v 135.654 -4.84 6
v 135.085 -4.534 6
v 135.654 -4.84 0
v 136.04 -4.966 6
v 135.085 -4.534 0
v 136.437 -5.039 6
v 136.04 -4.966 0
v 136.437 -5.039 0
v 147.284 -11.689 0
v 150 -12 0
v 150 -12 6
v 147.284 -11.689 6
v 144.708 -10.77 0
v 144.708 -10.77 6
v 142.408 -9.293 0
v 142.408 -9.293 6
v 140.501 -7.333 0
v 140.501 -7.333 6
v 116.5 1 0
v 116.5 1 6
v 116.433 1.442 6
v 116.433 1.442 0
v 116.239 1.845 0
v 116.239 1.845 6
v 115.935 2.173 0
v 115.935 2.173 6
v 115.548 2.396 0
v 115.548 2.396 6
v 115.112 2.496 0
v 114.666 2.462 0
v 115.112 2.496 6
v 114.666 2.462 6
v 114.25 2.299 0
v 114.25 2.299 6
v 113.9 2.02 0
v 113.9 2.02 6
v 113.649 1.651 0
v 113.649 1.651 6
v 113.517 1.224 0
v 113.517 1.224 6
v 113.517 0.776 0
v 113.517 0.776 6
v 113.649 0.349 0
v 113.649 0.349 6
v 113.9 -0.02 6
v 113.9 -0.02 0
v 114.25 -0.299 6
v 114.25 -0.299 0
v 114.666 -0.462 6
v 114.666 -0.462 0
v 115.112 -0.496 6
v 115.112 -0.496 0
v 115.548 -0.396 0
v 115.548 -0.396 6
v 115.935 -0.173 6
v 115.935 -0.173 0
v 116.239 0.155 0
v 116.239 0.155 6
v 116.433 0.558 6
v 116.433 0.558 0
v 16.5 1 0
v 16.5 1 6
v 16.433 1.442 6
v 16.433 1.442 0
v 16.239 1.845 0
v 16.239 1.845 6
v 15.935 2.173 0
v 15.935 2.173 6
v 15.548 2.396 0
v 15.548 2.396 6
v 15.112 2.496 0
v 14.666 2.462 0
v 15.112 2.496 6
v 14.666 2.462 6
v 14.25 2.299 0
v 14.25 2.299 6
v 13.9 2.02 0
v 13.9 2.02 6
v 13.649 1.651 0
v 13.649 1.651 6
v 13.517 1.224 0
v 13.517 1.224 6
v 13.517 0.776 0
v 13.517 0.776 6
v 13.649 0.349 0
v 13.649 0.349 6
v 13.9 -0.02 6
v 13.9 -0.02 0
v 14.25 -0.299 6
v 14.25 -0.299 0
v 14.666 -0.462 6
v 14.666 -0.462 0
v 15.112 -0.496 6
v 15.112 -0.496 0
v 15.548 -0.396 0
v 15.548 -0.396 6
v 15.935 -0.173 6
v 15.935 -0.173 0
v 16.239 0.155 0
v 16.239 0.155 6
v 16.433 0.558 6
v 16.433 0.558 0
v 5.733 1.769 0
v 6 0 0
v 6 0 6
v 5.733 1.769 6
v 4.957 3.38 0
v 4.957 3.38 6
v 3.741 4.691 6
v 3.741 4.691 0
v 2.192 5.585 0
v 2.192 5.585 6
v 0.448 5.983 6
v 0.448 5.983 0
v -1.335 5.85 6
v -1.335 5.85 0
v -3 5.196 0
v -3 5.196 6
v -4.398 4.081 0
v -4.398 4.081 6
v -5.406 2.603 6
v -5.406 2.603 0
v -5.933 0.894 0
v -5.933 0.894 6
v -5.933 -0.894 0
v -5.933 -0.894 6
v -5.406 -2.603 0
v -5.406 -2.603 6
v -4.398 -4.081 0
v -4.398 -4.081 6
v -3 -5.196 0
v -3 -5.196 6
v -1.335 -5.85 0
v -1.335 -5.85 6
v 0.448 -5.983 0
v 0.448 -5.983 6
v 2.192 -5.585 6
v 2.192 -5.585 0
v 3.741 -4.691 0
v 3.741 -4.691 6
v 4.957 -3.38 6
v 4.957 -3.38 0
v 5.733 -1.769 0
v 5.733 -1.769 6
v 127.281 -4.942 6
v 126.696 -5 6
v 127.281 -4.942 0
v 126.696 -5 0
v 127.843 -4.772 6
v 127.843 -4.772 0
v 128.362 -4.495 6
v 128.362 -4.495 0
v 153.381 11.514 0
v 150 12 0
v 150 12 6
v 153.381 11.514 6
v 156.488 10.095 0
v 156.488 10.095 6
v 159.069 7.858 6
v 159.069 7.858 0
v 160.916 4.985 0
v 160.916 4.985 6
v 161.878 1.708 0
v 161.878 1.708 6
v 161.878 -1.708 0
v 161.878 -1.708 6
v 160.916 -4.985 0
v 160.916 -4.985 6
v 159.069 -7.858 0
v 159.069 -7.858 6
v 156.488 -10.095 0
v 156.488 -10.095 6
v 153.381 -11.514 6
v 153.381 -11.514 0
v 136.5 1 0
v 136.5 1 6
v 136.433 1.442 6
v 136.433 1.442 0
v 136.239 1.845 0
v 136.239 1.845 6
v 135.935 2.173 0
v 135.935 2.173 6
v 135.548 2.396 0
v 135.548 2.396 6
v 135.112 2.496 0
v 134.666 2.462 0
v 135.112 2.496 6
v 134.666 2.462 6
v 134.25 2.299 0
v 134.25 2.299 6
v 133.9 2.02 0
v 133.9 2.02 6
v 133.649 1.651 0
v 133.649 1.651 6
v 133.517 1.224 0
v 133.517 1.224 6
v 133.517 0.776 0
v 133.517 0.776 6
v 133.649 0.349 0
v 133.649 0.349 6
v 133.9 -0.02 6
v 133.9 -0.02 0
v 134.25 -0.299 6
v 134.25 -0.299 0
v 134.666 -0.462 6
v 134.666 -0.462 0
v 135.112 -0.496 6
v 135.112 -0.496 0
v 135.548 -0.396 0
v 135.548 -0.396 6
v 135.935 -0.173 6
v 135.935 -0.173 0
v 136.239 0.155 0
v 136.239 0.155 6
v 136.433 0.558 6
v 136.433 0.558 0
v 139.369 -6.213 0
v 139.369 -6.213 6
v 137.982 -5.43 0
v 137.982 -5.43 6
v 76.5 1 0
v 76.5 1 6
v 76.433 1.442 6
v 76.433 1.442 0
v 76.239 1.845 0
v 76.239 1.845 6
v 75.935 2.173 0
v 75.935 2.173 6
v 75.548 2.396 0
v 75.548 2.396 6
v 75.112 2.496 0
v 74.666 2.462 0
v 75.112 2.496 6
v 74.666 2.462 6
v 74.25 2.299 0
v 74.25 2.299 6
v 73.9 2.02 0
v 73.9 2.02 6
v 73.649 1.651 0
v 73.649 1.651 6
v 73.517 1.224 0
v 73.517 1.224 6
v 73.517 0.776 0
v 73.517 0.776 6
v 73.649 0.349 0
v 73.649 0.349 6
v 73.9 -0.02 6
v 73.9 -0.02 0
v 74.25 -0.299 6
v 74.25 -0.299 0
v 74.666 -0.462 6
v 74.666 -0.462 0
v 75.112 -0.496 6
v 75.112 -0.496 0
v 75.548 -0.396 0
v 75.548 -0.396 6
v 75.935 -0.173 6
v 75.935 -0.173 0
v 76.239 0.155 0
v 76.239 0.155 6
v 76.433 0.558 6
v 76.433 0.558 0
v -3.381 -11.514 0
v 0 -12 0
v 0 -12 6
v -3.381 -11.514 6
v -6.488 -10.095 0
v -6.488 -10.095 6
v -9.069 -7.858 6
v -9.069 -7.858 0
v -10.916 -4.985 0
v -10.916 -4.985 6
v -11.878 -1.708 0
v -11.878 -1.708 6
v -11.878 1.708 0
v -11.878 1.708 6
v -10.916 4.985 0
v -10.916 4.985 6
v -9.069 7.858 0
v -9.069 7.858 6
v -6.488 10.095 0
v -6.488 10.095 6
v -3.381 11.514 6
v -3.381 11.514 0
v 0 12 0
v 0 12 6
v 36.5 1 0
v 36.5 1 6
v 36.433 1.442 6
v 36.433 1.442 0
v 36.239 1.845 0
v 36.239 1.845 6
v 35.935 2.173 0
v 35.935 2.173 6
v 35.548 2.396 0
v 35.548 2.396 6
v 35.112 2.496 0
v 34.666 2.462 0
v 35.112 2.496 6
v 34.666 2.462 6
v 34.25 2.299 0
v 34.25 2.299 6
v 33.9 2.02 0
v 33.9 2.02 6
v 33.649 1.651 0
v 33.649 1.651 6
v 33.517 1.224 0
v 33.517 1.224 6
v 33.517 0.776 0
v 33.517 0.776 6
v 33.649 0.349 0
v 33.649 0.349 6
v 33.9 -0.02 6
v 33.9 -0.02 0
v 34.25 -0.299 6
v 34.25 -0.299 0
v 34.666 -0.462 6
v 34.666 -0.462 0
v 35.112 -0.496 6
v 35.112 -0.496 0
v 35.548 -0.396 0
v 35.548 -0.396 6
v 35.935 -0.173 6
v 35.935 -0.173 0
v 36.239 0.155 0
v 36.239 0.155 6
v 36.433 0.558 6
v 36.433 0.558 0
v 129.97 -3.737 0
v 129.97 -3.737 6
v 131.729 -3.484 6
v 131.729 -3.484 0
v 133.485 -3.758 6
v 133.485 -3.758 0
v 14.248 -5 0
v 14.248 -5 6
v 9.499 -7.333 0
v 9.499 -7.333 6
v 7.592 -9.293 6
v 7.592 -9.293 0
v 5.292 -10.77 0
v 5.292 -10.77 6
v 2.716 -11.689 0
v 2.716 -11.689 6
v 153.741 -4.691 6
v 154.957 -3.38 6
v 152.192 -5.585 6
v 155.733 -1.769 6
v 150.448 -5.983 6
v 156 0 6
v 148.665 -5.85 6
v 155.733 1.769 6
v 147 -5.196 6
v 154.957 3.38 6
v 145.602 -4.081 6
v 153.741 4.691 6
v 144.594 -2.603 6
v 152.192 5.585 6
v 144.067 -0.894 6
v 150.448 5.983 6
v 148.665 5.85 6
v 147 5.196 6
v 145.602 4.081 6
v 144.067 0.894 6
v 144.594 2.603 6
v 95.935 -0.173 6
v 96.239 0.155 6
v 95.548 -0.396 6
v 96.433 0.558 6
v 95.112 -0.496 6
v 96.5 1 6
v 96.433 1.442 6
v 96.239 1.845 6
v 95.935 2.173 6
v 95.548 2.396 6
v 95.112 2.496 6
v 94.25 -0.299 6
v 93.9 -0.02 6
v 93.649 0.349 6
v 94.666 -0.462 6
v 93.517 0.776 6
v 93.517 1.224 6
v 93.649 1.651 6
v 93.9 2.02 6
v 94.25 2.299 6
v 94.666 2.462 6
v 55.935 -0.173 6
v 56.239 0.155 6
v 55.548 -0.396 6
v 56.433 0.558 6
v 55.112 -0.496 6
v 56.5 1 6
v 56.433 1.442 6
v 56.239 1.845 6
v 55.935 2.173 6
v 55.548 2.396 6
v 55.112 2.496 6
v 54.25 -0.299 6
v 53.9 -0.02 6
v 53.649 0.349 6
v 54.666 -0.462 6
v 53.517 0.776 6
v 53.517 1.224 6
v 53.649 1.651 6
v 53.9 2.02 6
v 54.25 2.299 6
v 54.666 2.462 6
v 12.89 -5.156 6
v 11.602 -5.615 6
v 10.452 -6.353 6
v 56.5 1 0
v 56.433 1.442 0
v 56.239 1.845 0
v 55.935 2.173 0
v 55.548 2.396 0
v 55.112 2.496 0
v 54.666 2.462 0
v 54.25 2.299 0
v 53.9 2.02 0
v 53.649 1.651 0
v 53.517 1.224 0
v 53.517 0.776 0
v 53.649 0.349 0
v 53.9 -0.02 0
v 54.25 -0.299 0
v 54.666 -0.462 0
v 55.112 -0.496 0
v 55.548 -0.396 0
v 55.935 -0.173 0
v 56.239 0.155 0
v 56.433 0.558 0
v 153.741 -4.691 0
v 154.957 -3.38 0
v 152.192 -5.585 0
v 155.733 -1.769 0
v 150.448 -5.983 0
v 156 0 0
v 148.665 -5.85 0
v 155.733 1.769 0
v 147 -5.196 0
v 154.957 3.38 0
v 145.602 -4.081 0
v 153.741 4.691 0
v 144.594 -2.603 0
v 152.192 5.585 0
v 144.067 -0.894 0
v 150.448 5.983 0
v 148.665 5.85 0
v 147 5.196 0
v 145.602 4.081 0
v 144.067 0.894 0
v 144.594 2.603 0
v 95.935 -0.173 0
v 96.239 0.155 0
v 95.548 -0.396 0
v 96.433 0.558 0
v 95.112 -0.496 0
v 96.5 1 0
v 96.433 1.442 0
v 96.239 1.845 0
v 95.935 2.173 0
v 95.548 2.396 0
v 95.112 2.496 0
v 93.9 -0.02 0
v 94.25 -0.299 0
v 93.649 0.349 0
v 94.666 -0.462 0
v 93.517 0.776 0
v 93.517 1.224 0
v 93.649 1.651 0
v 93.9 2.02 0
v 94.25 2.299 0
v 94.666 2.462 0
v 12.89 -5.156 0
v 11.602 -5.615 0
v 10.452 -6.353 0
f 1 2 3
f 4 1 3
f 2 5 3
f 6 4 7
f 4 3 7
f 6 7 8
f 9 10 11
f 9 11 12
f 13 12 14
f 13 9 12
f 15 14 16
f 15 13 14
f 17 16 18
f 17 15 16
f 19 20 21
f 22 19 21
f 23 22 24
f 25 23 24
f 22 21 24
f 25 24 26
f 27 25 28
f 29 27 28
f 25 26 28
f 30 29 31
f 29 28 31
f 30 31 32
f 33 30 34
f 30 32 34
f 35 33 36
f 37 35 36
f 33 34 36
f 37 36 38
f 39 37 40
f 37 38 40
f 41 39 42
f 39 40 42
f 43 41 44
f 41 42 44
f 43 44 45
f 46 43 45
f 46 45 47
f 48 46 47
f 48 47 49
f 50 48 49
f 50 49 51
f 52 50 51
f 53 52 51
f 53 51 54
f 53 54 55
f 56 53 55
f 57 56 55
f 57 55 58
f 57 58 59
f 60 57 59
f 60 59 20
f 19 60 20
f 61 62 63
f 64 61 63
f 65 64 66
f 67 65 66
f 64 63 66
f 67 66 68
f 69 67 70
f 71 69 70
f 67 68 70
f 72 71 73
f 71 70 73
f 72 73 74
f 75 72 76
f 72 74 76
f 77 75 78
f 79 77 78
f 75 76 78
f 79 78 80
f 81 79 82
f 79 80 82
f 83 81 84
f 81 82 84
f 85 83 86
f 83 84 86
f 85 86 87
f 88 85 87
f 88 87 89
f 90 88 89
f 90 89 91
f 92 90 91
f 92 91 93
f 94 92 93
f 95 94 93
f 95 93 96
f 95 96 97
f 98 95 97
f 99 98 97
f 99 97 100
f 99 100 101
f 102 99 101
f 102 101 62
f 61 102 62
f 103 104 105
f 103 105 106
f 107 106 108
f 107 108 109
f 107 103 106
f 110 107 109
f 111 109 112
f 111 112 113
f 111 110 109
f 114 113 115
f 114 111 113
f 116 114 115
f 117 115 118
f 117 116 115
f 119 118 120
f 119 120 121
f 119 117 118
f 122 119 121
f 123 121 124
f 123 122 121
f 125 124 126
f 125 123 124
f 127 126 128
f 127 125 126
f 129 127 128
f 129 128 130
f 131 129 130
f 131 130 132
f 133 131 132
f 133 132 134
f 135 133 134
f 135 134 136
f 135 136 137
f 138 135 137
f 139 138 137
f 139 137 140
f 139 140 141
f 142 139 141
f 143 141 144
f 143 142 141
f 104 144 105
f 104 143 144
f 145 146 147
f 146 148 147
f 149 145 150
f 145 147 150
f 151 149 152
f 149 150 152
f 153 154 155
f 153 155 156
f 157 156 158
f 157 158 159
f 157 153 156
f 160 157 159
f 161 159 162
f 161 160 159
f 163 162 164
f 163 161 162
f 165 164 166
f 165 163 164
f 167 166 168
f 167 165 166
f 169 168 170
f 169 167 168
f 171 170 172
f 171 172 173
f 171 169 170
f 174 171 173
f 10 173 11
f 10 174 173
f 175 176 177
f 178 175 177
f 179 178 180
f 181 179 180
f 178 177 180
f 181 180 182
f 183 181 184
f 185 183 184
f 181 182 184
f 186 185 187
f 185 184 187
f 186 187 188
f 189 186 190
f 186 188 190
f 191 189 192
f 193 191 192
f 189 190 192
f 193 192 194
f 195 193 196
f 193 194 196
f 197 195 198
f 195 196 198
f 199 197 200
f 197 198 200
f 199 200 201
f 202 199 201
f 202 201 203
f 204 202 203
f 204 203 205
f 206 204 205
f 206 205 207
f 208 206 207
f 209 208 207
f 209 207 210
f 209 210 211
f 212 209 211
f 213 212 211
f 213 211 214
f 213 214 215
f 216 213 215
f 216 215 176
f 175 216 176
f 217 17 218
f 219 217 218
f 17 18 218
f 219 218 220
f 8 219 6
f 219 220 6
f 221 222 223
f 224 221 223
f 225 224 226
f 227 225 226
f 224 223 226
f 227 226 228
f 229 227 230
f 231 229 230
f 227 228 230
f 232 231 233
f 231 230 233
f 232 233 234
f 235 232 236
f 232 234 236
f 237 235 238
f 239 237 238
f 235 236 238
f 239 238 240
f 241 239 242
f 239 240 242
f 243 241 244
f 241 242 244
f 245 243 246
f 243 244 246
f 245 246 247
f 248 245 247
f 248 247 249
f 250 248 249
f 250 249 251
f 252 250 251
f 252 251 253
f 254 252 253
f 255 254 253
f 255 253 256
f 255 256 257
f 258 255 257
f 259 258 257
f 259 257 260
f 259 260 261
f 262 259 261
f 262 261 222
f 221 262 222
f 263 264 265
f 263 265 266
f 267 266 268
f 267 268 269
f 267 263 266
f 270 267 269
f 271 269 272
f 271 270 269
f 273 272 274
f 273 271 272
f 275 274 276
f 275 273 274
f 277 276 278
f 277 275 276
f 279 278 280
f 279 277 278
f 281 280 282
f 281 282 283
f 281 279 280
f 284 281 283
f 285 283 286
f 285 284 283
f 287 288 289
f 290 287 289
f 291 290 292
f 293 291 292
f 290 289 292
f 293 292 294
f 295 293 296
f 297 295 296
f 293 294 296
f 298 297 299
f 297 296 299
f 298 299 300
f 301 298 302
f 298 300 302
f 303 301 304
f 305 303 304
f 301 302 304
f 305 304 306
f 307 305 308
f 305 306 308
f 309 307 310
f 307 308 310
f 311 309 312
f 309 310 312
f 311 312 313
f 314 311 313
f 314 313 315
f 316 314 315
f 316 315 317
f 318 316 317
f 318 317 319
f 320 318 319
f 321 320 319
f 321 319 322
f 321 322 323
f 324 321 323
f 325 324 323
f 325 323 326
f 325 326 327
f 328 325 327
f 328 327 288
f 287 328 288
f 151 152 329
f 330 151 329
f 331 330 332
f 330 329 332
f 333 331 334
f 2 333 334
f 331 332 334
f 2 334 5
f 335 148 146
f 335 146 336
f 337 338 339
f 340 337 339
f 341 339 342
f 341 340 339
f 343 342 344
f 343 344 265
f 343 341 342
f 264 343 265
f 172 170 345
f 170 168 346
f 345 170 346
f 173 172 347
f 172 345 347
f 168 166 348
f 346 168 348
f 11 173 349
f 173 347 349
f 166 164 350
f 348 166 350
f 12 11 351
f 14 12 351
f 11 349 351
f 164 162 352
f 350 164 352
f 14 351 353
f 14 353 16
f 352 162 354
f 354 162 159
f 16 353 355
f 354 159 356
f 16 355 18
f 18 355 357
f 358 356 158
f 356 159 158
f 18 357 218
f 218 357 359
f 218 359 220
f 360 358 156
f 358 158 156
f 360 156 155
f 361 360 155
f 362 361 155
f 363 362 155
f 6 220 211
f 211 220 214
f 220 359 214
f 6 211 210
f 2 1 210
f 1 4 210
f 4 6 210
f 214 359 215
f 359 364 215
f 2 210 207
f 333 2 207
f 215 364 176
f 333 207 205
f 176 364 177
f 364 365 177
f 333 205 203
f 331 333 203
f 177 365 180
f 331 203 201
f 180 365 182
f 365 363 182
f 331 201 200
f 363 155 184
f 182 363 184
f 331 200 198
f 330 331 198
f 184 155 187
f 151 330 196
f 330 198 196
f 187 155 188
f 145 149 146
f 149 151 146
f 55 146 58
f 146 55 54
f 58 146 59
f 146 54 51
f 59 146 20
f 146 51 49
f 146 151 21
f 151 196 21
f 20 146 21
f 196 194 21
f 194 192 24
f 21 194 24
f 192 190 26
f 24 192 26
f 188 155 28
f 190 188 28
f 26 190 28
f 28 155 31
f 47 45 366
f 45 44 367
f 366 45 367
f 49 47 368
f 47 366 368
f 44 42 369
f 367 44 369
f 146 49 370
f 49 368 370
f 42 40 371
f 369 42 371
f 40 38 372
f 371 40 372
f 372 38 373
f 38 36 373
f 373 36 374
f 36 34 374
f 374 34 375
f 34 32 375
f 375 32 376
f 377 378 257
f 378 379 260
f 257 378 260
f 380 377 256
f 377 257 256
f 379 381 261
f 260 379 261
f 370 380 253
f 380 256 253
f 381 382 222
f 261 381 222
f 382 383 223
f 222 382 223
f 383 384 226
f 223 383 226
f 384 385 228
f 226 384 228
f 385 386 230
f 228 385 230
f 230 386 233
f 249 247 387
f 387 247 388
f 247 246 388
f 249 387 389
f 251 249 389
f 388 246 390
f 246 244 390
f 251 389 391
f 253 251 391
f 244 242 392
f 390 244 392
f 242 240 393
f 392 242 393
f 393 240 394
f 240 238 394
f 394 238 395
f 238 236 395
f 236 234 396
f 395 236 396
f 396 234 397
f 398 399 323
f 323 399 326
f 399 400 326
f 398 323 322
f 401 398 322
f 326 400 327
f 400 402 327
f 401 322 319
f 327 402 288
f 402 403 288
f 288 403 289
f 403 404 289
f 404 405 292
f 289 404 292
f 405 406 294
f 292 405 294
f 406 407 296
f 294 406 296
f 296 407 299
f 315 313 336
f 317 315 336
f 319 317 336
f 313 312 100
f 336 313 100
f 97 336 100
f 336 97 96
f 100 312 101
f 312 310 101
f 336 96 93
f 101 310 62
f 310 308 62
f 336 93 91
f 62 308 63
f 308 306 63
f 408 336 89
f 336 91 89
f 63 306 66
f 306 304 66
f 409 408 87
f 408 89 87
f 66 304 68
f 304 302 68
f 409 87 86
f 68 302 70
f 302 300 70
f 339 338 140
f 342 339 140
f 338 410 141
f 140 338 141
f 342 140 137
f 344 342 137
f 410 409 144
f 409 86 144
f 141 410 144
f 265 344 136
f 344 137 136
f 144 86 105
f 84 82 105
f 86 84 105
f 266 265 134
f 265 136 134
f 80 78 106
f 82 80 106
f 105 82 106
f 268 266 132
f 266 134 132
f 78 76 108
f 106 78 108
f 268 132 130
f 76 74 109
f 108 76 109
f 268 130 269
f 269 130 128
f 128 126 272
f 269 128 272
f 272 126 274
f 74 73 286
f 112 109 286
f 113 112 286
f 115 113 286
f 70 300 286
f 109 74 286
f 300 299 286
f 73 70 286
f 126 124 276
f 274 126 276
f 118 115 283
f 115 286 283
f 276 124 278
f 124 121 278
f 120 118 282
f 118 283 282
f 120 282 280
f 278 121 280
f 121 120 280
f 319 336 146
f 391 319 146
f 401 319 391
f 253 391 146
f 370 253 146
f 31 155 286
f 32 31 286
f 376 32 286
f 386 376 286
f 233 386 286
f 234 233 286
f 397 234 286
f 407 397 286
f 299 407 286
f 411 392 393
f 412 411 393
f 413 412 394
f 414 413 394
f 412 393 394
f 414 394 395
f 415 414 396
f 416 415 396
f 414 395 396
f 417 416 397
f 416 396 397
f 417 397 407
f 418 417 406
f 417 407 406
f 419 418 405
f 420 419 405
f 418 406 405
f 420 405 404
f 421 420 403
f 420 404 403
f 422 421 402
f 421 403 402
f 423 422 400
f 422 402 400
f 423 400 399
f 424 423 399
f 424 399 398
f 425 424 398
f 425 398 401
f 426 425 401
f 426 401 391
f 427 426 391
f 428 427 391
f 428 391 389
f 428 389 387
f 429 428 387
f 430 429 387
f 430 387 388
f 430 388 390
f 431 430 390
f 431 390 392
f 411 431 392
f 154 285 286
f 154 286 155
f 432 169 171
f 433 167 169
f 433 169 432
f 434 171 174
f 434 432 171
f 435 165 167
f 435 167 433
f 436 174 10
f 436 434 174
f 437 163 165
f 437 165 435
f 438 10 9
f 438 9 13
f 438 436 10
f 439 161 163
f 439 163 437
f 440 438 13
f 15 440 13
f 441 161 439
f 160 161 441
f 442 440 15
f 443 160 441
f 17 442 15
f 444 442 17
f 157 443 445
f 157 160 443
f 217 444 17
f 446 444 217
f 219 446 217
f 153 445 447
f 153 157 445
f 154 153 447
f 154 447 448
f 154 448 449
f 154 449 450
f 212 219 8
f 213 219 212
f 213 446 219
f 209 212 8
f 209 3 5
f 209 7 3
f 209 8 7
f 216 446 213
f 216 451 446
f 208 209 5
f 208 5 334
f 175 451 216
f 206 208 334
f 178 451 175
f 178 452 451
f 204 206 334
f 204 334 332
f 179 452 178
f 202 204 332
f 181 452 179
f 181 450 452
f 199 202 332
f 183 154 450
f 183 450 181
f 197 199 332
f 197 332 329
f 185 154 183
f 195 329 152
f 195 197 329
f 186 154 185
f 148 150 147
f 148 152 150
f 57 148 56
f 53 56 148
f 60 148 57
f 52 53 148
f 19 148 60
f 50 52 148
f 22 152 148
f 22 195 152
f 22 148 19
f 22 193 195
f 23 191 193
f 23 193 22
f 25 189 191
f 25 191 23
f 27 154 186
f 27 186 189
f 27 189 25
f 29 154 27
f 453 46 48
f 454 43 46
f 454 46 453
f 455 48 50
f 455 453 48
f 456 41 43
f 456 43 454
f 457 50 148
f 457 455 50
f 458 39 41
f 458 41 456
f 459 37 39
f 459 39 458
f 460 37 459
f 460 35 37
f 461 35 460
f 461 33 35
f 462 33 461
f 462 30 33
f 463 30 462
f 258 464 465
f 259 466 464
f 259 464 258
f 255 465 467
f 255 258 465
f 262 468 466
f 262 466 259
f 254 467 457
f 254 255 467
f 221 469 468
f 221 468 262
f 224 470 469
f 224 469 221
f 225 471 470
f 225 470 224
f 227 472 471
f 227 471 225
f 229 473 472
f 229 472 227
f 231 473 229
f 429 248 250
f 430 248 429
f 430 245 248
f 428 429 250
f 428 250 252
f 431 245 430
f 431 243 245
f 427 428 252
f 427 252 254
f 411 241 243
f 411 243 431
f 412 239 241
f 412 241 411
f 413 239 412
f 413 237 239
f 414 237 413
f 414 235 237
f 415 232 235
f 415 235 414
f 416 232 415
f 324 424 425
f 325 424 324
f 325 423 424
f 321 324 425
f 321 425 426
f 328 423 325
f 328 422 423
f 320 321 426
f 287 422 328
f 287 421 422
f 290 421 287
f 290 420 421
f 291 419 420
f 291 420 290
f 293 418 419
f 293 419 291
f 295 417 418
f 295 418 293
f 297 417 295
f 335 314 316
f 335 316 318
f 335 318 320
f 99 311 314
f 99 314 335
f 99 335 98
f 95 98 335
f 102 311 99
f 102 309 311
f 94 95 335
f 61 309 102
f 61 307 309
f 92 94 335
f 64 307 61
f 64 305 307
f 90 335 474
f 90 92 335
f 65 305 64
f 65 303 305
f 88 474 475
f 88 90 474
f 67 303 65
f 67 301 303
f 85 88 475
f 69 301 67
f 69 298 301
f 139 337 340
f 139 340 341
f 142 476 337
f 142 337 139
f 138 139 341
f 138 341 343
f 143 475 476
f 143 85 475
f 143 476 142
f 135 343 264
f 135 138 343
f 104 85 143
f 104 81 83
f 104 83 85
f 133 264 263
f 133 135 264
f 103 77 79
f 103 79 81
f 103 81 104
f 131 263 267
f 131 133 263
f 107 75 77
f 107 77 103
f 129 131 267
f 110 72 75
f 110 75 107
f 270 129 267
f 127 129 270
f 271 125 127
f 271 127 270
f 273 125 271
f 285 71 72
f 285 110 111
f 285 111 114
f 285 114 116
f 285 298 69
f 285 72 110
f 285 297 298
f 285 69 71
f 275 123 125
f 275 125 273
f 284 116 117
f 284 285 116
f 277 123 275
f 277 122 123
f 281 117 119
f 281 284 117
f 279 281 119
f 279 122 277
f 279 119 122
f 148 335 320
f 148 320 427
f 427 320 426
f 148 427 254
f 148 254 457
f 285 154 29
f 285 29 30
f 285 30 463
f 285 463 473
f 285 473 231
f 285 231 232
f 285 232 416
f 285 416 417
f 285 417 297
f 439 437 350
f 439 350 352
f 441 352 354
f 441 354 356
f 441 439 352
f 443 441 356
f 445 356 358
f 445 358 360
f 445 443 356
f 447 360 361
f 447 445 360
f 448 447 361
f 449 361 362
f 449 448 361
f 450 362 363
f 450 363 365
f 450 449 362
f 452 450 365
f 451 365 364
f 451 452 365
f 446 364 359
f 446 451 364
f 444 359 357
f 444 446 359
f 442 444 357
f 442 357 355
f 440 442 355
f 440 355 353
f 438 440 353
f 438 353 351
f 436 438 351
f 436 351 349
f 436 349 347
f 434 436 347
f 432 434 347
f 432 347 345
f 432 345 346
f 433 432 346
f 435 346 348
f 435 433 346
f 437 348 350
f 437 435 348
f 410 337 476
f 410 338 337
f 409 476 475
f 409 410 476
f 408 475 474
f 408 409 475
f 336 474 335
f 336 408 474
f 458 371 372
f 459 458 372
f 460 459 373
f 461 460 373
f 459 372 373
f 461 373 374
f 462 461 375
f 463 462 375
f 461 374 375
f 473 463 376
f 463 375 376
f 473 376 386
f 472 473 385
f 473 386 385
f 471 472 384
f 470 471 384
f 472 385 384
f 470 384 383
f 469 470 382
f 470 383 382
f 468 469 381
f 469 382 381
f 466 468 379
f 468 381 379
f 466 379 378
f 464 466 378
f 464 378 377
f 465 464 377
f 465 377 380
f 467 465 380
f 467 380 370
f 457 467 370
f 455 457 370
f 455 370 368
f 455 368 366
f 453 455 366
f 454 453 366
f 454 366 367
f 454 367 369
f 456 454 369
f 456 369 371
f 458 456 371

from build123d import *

# Parameters (mm, degrees)
SKETCH_1_R          = 6
EXTRUDE_1_DEPTH     = 6
CUT_EXTRUDE_START   = -6
CUT_EXTRUDE_1_DEPTH = 6
FILLET_1_R          = 6
SKETCH_6_R          = 1.5
CUT_EXTRUDE_2_DEPTH = 10
SKETCH_7_R          = 6
CUT_EXTRUDE_3_DEPTH = 10
FILLET_2_R          = 3


with BuildPart() as part:
    # 草图1 → 凸台-拉伸1 (new body)
    with BuildSketch(Plane.XY):
        with BuildLine():
            Line((0, 12), (150, 12))
            ThreePointArc((150, 12), (162, 0), (150, -12))
            Line((150, -12), (0, -12))
            ThreePointArc((0, -12), (-12, 0), (0, 12))
        make_face()
        Circle(SKETCH_1_R, mode=Mode.SUBTRACT)
        with Locations((150, 0)):
            Circle(SKETCH_1_R, mode=Mode.SUBTRACT)
    extrude(amount=EXTRUDE_1_DEPTH)

    # 草图2 → 切除-拉伸1 (cut)
    with BuildSketch(Plane.XY.offset(6).offset(CUT_EXTRUDE_START)):
        with BuildLine():
            ThreePointArc((10.908712115, -5), (6.480740698, -10.099504938), (0, -12))
            Line((0, -12), (150, -12))
            ThreePointArc((150, -12), (143.519259302, -10.099504938), (139.091287885, -5))
            Line((139.091287885, -5), (10.908712115, -5))
        make_face()
    extrude(amount=CUT_EXTRUDE_1_DEPTH, mode=Mode.SUBTRACT)

    # 圆角1
    fillet_1_edges = [part.edges().sort_by_distance(p)[0] for p in [
        (139.091287885, -5, 3),
        (10.908712115, -5, 3),
    ]]
    fillet(fillet_1_edges, radius=FILLET_1_R)

    # 草图6 → 切除-拉伸2 (cut)
    with BuildSketch(Plane.XY.offset(6)):
        with Locations((15, 1)):
            Circle(SKETCH_6_R)
        with Locations((35, 1)):
            Circle(SKETCH_6_R)
        with Locations((55, 1)):
            Circle(SKETCH_6_R)
        with Locations((75, 1)):
            Circle(SKETCH_6_R)
        with Locations((95, 1)):
            Circle(SKETCH_6_R)
        with Locations((115, 1)):
            Circle(SKETCH_6_R)
        with Locations((135, 1)):
            Circle(SKETCH_6_R)
    extrude(amount=-CUT_EXTRUDE_2_DEPTH, mode=Mode.SUBTRACT)

    # 草图7 → 切除-拉伸3 (cut)
    with BuildSketch(Plane(origin=(0, 0, 0), x_dir=(-1, 0, 0), z_dir=(0, 0, -1))):
        with Locations((-131.694159211, -9.484293539)):
            Circle(SKETCH_7_R)
    extrude(amount=-CUT_EXTRUDE_3_DEPTH, mode=Mode.SUBTRACT)

    # 圆角2
    fillet_2_edges = [part.edges().sort_by_distance(p)[0] for p in [
        (127.707793516, -5, 3),
        (135.680524907, -5, 3),
    ]]
    fillet(fillet_2_edges, radius=FILLET_2_R)


solid = part.part
